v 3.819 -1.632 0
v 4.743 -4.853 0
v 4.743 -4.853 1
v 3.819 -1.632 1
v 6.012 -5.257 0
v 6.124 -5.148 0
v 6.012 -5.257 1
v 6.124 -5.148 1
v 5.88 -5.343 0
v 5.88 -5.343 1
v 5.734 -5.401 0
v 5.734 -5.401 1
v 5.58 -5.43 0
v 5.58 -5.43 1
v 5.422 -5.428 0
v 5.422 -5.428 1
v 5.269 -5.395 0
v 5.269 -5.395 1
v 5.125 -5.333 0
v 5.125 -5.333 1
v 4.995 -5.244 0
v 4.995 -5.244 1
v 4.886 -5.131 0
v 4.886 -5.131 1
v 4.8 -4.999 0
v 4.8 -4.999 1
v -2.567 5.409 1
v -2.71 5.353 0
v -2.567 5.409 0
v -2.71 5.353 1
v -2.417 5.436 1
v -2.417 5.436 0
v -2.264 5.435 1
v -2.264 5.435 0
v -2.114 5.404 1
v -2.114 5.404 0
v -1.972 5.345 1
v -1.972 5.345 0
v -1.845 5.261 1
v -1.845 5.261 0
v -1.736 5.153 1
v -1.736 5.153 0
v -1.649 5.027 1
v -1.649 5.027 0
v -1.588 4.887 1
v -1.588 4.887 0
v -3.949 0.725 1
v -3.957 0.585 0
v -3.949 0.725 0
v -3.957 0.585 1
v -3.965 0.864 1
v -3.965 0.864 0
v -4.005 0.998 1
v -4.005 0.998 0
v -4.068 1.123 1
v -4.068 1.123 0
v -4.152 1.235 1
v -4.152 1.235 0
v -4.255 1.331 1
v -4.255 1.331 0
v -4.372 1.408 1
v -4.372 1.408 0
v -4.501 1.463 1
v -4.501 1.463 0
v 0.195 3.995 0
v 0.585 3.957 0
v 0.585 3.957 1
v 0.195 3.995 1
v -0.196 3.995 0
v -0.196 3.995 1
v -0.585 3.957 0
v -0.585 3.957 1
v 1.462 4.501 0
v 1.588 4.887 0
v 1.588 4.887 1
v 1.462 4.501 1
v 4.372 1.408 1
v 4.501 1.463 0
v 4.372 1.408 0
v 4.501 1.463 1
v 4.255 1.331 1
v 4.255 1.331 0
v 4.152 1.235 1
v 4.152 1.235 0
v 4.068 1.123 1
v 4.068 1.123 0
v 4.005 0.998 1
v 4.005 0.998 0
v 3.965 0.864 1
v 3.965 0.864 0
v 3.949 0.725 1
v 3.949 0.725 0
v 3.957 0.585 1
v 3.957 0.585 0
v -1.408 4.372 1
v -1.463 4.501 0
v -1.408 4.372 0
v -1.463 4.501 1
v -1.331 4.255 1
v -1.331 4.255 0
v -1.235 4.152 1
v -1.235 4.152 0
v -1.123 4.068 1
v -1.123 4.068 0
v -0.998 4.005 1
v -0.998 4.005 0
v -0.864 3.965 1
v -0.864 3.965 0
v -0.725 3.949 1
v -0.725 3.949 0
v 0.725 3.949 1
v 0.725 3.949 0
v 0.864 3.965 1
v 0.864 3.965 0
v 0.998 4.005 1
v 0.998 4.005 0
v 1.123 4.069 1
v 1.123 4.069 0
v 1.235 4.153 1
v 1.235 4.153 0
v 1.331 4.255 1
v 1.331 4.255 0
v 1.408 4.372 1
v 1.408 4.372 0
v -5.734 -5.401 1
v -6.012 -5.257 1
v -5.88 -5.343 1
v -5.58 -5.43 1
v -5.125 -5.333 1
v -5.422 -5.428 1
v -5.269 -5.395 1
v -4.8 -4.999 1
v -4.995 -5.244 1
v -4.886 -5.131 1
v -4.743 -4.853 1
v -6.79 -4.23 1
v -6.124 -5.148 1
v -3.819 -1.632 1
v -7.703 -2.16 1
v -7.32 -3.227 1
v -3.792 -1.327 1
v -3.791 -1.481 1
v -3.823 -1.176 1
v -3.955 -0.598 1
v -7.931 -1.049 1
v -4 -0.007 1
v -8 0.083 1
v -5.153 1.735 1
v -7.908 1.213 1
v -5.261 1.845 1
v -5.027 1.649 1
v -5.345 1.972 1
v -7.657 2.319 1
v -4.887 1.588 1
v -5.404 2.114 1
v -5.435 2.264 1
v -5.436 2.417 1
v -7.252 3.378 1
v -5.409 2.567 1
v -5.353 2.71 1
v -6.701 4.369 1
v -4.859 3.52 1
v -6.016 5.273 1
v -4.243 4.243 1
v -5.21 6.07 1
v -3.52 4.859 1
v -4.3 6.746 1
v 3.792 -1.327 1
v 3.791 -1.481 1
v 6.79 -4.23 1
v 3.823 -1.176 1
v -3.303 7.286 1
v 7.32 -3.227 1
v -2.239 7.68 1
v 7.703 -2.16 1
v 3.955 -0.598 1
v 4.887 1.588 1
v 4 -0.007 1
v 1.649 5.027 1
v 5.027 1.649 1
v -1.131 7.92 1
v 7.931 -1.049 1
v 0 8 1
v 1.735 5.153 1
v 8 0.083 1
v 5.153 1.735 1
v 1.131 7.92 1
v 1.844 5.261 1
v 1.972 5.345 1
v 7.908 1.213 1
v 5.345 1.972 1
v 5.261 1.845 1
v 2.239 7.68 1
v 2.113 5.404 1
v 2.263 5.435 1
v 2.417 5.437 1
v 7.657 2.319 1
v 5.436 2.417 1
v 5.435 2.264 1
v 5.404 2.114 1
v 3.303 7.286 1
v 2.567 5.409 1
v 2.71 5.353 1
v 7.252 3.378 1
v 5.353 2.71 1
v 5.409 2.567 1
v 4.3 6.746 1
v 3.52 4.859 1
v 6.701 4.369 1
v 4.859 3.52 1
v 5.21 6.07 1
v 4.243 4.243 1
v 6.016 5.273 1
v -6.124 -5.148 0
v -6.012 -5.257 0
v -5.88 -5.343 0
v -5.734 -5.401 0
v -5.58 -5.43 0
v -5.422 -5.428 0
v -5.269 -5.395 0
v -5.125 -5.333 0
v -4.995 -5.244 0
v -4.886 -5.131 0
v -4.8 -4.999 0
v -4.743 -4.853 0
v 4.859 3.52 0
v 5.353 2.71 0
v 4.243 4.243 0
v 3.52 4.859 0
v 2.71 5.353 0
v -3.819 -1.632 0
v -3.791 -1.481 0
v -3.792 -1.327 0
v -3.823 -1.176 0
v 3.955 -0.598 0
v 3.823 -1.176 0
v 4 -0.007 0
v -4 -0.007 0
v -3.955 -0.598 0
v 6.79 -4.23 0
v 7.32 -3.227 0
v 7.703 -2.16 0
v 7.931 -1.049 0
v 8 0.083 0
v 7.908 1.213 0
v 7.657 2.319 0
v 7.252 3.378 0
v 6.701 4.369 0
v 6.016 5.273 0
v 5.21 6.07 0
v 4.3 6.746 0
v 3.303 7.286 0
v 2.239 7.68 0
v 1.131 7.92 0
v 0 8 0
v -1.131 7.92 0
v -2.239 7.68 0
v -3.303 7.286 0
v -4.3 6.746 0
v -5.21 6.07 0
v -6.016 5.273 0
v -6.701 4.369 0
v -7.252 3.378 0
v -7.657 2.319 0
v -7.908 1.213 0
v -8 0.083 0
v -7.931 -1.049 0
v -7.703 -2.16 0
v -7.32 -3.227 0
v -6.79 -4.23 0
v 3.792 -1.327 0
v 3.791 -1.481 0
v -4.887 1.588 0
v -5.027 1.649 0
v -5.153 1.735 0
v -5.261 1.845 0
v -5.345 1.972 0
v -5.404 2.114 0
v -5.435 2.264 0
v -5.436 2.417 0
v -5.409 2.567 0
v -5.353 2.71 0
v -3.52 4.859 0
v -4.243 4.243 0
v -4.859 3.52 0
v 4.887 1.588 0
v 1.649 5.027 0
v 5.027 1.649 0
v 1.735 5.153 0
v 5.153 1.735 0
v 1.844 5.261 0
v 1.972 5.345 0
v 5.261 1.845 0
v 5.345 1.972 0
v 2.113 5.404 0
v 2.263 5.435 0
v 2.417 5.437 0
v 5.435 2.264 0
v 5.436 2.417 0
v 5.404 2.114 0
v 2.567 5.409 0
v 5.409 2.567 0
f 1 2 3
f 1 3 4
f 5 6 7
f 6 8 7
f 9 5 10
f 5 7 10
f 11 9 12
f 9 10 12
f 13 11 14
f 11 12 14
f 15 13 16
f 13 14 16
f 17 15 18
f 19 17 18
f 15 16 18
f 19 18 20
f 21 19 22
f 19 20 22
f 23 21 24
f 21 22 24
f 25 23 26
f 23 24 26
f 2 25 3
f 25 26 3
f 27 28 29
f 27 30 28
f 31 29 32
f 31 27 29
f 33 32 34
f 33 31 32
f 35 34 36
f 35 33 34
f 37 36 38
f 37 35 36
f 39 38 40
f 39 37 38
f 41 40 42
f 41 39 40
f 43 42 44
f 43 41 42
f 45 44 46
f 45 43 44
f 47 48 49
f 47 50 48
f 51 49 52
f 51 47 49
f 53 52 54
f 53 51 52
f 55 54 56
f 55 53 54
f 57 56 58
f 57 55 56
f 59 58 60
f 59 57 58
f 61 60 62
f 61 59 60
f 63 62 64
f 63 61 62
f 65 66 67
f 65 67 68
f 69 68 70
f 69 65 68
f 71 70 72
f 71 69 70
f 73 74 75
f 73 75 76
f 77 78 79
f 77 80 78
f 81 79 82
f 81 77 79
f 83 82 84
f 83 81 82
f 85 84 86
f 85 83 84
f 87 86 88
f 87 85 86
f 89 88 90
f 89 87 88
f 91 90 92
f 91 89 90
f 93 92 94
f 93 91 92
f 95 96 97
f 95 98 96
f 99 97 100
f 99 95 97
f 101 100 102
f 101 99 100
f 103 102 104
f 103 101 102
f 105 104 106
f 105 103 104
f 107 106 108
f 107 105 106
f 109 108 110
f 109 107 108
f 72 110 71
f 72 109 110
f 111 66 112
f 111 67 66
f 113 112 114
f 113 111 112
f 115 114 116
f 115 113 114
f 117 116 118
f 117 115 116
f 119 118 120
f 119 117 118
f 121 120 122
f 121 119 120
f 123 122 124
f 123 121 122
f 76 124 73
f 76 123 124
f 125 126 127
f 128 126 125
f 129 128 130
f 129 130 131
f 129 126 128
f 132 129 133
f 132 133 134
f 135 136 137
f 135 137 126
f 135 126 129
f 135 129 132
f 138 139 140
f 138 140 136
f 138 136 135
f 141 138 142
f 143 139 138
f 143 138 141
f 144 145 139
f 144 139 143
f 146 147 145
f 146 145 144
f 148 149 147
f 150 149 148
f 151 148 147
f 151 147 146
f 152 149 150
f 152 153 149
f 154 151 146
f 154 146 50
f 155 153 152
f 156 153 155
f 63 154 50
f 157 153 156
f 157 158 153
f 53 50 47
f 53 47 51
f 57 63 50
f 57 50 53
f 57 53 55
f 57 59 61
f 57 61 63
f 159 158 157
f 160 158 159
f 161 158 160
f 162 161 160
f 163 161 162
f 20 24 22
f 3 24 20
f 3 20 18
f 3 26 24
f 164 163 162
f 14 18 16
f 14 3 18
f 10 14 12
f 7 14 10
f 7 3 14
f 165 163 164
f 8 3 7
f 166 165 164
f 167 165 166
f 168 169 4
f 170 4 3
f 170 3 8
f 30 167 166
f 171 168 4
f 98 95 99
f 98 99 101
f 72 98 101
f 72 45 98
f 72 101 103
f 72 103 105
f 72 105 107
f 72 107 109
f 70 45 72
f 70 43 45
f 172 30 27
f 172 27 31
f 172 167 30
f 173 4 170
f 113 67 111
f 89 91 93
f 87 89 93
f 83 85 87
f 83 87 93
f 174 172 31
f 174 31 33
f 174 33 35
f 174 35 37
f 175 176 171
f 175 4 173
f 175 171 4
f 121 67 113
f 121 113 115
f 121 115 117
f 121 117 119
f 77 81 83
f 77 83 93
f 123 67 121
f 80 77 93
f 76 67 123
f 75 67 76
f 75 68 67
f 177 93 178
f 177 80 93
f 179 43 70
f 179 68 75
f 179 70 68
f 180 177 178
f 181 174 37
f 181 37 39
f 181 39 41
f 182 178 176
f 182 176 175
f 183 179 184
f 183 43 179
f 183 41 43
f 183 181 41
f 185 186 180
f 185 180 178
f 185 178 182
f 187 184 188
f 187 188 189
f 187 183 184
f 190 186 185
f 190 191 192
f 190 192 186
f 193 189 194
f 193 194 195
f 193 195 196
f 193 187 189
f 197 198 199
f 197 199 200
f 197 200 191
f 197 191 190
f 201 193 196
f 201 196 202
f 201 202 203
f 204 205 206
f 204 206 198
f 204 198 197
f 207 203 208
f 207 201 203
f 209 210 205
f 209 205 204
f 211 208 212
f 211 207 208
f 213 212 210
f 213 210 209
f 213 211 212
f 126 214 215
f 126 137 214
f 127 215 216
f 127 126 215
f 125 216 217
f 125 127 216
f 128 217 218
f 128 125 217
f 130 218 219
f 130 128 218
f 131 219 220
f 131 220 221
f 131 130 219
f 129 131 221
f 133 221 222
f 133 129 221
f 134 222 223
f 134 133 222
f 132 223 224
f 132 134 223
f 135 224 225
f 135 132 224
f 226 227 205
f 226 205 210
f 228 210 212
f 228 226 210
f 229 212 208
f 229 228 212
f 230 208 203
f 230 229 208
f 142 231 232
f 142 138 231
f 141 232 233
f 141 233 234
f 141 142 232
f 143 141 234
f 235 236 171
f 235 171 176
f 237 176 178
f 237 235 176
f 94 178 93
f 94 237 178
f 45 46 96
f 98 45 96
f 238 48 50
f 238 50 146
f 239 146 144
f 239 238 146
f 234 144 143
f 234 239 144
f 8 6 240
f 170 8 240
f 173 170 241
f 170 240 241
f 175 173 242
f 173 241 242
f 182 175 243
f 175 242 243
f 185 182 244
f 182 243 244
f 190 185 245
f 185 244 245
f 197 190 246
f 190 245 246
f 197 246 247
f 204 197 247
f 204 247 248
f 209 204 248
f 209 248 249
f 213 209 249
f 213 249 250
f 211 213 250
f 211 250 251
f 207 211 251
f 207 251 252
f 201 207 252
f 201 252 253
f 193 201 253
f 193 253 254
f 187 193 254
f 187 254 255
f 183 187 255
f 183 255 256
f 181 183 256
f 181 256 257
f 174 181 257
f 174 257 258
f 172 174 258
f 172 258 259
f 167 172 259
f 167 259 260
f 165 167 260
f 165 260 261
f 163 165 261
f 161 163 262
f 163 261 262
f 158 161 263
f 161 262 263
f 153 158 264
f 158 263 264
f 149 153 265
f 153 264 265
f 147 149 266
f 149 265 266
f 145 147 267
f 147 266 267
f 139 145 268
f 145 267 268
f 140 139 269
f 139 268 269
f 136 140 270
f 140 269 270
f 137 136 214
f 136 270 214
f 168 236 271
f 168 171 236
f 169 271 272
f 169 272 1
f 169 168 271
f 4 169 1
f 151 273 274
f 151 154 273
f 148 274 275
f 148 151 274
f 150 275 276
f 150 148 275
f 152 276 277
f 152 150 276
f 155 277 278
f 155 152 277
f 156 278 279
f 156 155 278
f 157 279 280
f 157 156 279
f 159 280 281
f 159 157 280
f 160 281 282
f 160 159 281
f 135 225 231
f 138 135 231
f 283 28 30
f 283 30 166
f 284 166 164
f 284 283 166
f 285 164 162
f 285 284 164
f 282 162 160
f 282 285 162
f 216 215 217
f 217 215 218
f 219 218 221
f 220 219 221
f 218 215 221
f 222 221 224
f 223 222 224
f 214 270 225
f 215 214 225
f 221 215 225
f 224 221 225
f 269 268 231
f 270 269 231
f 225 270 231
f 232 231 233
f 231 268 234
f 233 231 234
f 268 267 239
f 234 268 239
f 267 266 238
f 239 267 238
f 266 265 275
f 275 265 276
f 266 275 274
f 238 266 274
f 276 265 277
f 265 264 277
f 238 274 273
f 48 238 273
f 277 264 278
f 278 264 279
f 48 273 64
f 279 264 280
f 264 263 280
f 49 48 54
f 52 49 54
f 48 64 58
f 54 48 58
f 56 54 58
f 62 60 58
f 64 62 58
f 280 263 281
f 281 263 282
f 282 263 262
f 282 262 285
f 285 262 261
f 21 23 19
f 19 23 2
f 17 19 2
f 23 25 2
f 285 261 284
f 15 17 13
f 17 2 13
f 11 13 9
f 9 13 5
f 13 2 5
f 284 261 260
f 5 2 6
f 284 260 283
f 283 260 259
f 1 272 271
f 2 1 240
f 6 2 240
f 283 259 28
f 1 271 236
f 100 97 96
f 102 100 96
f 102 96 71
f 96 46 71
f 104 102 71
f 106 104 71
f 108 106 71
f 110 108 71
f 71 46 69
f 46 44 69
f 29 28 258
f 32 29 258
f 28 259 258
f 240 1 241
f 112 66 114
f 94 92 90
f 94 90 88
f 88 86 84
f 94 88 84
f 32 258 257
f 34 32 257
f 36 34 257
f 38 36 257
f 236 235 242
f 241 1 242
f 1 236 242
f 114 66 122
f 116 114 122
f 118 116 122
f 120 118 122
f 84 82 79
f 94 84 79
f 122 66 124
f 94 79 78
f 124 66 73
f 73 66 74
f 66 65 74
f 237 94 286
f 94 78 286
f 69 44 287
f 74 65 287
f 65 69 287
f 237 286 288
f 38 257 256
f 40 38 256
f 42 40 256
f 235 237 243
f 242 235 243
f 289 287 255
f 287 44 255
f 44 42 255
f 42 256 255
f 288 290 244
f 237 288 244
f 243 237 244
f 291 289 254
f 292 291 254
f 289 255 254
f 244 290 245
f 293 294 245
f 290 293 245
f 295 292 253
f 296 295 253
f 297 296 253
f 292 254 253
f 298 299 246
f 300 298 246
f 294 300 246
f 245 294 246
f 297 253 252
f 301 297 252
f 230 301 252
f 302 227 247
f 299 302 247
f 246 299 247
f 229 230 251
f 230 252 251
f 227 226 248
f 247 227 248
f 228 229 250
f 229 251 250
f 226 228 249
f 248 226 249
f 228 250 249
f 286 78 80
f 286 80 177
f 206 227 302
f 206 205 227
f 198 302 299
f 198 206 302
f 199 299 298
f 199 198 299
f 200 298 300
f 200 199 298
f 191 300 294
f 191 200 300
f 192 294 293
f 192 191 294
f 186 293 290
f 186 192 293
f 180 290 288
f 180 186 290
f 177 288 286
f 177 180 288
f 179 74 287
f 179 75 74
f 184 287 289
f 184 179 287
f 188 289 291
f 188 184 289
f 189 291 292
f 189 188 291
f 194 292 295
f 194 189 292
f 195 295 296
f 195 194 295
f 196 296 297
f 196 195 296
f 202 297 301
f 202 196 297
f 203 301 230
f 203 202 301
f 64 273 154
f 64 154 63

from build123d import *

# Parameters (mm, degrees)
PAD_DEPTH = 1
FILLET_R  = 0.8


with BuildPart() as part:
    # Sketch → Pad (new body)
    with BuildSketch(Plane.XY):
        with BuildLine():
            ThreePointArc((5.114745, -6.151372), (0, 8), (-5.114745, -6.151372))
            Line((-5.114745, -6.151372), (-3.75, -1.391941))
            ThreePointArc((-3.804226, 1.236068), (-3.999149, -0.082518), (-3.75, -1.391941))
            Line((-5.706339, 1.854102), (-3.804226, 1.236068))
            ThreePointArc((-1.854249, 5.706291), (-4.242695, 4.242586), (-5.706339, 1.854102))
            Line((-1.854249, 5.706291), (-1.236068, 3.804226))
            ThreePointArc((1.236068, 3.804226), (0, 4), (-1.236068, 3.804226))
            Line((1.853955, 5.706387), (1.236068, 3.804226))
            ThreePointArc((5.706339, 1.854102), (4.242586, 4.242695), (1.853955, 5.706387))
            Line((3.804226, 1.236068), (5.706339, 1.854102))
            ThreePointArc((3.75, -1.391941), (3.999149, -0.082518), (3.804226, 1.236068))
            Line((5.114745, -6.151372), (3.75, -1.391941))
        make_face()
    extrude(amount=PAD_DEPTH)

    # Fillet
    fillet_edges = [part.edges().sort_by_distance(p)[0] for p in [
        (-5.114745, -6.151372, 0.5),
        (-3.75, -1.391941, 0.5),
        (-3.804226, 1.236068, 0.5),
        (-5.706339, 1.854102, 0.5),
        (-1.854249, 5.706291, 0.5),
        (-1.236068, 3.804226, 0.5),
        (1.236068, 3.804226, 0.5),
        (1.853955, 5.706387, 0.5),
        (5.706339, 1.854102, 0.5),
        (3.804226, 1.236068, 0.5),
        (3.75, -1.391941, 0.5),
        (5.114745, -6.151372, 0.5),
    ]]
    fillet(fillet_edges, radius=FILLET_R)


solid = part.part
